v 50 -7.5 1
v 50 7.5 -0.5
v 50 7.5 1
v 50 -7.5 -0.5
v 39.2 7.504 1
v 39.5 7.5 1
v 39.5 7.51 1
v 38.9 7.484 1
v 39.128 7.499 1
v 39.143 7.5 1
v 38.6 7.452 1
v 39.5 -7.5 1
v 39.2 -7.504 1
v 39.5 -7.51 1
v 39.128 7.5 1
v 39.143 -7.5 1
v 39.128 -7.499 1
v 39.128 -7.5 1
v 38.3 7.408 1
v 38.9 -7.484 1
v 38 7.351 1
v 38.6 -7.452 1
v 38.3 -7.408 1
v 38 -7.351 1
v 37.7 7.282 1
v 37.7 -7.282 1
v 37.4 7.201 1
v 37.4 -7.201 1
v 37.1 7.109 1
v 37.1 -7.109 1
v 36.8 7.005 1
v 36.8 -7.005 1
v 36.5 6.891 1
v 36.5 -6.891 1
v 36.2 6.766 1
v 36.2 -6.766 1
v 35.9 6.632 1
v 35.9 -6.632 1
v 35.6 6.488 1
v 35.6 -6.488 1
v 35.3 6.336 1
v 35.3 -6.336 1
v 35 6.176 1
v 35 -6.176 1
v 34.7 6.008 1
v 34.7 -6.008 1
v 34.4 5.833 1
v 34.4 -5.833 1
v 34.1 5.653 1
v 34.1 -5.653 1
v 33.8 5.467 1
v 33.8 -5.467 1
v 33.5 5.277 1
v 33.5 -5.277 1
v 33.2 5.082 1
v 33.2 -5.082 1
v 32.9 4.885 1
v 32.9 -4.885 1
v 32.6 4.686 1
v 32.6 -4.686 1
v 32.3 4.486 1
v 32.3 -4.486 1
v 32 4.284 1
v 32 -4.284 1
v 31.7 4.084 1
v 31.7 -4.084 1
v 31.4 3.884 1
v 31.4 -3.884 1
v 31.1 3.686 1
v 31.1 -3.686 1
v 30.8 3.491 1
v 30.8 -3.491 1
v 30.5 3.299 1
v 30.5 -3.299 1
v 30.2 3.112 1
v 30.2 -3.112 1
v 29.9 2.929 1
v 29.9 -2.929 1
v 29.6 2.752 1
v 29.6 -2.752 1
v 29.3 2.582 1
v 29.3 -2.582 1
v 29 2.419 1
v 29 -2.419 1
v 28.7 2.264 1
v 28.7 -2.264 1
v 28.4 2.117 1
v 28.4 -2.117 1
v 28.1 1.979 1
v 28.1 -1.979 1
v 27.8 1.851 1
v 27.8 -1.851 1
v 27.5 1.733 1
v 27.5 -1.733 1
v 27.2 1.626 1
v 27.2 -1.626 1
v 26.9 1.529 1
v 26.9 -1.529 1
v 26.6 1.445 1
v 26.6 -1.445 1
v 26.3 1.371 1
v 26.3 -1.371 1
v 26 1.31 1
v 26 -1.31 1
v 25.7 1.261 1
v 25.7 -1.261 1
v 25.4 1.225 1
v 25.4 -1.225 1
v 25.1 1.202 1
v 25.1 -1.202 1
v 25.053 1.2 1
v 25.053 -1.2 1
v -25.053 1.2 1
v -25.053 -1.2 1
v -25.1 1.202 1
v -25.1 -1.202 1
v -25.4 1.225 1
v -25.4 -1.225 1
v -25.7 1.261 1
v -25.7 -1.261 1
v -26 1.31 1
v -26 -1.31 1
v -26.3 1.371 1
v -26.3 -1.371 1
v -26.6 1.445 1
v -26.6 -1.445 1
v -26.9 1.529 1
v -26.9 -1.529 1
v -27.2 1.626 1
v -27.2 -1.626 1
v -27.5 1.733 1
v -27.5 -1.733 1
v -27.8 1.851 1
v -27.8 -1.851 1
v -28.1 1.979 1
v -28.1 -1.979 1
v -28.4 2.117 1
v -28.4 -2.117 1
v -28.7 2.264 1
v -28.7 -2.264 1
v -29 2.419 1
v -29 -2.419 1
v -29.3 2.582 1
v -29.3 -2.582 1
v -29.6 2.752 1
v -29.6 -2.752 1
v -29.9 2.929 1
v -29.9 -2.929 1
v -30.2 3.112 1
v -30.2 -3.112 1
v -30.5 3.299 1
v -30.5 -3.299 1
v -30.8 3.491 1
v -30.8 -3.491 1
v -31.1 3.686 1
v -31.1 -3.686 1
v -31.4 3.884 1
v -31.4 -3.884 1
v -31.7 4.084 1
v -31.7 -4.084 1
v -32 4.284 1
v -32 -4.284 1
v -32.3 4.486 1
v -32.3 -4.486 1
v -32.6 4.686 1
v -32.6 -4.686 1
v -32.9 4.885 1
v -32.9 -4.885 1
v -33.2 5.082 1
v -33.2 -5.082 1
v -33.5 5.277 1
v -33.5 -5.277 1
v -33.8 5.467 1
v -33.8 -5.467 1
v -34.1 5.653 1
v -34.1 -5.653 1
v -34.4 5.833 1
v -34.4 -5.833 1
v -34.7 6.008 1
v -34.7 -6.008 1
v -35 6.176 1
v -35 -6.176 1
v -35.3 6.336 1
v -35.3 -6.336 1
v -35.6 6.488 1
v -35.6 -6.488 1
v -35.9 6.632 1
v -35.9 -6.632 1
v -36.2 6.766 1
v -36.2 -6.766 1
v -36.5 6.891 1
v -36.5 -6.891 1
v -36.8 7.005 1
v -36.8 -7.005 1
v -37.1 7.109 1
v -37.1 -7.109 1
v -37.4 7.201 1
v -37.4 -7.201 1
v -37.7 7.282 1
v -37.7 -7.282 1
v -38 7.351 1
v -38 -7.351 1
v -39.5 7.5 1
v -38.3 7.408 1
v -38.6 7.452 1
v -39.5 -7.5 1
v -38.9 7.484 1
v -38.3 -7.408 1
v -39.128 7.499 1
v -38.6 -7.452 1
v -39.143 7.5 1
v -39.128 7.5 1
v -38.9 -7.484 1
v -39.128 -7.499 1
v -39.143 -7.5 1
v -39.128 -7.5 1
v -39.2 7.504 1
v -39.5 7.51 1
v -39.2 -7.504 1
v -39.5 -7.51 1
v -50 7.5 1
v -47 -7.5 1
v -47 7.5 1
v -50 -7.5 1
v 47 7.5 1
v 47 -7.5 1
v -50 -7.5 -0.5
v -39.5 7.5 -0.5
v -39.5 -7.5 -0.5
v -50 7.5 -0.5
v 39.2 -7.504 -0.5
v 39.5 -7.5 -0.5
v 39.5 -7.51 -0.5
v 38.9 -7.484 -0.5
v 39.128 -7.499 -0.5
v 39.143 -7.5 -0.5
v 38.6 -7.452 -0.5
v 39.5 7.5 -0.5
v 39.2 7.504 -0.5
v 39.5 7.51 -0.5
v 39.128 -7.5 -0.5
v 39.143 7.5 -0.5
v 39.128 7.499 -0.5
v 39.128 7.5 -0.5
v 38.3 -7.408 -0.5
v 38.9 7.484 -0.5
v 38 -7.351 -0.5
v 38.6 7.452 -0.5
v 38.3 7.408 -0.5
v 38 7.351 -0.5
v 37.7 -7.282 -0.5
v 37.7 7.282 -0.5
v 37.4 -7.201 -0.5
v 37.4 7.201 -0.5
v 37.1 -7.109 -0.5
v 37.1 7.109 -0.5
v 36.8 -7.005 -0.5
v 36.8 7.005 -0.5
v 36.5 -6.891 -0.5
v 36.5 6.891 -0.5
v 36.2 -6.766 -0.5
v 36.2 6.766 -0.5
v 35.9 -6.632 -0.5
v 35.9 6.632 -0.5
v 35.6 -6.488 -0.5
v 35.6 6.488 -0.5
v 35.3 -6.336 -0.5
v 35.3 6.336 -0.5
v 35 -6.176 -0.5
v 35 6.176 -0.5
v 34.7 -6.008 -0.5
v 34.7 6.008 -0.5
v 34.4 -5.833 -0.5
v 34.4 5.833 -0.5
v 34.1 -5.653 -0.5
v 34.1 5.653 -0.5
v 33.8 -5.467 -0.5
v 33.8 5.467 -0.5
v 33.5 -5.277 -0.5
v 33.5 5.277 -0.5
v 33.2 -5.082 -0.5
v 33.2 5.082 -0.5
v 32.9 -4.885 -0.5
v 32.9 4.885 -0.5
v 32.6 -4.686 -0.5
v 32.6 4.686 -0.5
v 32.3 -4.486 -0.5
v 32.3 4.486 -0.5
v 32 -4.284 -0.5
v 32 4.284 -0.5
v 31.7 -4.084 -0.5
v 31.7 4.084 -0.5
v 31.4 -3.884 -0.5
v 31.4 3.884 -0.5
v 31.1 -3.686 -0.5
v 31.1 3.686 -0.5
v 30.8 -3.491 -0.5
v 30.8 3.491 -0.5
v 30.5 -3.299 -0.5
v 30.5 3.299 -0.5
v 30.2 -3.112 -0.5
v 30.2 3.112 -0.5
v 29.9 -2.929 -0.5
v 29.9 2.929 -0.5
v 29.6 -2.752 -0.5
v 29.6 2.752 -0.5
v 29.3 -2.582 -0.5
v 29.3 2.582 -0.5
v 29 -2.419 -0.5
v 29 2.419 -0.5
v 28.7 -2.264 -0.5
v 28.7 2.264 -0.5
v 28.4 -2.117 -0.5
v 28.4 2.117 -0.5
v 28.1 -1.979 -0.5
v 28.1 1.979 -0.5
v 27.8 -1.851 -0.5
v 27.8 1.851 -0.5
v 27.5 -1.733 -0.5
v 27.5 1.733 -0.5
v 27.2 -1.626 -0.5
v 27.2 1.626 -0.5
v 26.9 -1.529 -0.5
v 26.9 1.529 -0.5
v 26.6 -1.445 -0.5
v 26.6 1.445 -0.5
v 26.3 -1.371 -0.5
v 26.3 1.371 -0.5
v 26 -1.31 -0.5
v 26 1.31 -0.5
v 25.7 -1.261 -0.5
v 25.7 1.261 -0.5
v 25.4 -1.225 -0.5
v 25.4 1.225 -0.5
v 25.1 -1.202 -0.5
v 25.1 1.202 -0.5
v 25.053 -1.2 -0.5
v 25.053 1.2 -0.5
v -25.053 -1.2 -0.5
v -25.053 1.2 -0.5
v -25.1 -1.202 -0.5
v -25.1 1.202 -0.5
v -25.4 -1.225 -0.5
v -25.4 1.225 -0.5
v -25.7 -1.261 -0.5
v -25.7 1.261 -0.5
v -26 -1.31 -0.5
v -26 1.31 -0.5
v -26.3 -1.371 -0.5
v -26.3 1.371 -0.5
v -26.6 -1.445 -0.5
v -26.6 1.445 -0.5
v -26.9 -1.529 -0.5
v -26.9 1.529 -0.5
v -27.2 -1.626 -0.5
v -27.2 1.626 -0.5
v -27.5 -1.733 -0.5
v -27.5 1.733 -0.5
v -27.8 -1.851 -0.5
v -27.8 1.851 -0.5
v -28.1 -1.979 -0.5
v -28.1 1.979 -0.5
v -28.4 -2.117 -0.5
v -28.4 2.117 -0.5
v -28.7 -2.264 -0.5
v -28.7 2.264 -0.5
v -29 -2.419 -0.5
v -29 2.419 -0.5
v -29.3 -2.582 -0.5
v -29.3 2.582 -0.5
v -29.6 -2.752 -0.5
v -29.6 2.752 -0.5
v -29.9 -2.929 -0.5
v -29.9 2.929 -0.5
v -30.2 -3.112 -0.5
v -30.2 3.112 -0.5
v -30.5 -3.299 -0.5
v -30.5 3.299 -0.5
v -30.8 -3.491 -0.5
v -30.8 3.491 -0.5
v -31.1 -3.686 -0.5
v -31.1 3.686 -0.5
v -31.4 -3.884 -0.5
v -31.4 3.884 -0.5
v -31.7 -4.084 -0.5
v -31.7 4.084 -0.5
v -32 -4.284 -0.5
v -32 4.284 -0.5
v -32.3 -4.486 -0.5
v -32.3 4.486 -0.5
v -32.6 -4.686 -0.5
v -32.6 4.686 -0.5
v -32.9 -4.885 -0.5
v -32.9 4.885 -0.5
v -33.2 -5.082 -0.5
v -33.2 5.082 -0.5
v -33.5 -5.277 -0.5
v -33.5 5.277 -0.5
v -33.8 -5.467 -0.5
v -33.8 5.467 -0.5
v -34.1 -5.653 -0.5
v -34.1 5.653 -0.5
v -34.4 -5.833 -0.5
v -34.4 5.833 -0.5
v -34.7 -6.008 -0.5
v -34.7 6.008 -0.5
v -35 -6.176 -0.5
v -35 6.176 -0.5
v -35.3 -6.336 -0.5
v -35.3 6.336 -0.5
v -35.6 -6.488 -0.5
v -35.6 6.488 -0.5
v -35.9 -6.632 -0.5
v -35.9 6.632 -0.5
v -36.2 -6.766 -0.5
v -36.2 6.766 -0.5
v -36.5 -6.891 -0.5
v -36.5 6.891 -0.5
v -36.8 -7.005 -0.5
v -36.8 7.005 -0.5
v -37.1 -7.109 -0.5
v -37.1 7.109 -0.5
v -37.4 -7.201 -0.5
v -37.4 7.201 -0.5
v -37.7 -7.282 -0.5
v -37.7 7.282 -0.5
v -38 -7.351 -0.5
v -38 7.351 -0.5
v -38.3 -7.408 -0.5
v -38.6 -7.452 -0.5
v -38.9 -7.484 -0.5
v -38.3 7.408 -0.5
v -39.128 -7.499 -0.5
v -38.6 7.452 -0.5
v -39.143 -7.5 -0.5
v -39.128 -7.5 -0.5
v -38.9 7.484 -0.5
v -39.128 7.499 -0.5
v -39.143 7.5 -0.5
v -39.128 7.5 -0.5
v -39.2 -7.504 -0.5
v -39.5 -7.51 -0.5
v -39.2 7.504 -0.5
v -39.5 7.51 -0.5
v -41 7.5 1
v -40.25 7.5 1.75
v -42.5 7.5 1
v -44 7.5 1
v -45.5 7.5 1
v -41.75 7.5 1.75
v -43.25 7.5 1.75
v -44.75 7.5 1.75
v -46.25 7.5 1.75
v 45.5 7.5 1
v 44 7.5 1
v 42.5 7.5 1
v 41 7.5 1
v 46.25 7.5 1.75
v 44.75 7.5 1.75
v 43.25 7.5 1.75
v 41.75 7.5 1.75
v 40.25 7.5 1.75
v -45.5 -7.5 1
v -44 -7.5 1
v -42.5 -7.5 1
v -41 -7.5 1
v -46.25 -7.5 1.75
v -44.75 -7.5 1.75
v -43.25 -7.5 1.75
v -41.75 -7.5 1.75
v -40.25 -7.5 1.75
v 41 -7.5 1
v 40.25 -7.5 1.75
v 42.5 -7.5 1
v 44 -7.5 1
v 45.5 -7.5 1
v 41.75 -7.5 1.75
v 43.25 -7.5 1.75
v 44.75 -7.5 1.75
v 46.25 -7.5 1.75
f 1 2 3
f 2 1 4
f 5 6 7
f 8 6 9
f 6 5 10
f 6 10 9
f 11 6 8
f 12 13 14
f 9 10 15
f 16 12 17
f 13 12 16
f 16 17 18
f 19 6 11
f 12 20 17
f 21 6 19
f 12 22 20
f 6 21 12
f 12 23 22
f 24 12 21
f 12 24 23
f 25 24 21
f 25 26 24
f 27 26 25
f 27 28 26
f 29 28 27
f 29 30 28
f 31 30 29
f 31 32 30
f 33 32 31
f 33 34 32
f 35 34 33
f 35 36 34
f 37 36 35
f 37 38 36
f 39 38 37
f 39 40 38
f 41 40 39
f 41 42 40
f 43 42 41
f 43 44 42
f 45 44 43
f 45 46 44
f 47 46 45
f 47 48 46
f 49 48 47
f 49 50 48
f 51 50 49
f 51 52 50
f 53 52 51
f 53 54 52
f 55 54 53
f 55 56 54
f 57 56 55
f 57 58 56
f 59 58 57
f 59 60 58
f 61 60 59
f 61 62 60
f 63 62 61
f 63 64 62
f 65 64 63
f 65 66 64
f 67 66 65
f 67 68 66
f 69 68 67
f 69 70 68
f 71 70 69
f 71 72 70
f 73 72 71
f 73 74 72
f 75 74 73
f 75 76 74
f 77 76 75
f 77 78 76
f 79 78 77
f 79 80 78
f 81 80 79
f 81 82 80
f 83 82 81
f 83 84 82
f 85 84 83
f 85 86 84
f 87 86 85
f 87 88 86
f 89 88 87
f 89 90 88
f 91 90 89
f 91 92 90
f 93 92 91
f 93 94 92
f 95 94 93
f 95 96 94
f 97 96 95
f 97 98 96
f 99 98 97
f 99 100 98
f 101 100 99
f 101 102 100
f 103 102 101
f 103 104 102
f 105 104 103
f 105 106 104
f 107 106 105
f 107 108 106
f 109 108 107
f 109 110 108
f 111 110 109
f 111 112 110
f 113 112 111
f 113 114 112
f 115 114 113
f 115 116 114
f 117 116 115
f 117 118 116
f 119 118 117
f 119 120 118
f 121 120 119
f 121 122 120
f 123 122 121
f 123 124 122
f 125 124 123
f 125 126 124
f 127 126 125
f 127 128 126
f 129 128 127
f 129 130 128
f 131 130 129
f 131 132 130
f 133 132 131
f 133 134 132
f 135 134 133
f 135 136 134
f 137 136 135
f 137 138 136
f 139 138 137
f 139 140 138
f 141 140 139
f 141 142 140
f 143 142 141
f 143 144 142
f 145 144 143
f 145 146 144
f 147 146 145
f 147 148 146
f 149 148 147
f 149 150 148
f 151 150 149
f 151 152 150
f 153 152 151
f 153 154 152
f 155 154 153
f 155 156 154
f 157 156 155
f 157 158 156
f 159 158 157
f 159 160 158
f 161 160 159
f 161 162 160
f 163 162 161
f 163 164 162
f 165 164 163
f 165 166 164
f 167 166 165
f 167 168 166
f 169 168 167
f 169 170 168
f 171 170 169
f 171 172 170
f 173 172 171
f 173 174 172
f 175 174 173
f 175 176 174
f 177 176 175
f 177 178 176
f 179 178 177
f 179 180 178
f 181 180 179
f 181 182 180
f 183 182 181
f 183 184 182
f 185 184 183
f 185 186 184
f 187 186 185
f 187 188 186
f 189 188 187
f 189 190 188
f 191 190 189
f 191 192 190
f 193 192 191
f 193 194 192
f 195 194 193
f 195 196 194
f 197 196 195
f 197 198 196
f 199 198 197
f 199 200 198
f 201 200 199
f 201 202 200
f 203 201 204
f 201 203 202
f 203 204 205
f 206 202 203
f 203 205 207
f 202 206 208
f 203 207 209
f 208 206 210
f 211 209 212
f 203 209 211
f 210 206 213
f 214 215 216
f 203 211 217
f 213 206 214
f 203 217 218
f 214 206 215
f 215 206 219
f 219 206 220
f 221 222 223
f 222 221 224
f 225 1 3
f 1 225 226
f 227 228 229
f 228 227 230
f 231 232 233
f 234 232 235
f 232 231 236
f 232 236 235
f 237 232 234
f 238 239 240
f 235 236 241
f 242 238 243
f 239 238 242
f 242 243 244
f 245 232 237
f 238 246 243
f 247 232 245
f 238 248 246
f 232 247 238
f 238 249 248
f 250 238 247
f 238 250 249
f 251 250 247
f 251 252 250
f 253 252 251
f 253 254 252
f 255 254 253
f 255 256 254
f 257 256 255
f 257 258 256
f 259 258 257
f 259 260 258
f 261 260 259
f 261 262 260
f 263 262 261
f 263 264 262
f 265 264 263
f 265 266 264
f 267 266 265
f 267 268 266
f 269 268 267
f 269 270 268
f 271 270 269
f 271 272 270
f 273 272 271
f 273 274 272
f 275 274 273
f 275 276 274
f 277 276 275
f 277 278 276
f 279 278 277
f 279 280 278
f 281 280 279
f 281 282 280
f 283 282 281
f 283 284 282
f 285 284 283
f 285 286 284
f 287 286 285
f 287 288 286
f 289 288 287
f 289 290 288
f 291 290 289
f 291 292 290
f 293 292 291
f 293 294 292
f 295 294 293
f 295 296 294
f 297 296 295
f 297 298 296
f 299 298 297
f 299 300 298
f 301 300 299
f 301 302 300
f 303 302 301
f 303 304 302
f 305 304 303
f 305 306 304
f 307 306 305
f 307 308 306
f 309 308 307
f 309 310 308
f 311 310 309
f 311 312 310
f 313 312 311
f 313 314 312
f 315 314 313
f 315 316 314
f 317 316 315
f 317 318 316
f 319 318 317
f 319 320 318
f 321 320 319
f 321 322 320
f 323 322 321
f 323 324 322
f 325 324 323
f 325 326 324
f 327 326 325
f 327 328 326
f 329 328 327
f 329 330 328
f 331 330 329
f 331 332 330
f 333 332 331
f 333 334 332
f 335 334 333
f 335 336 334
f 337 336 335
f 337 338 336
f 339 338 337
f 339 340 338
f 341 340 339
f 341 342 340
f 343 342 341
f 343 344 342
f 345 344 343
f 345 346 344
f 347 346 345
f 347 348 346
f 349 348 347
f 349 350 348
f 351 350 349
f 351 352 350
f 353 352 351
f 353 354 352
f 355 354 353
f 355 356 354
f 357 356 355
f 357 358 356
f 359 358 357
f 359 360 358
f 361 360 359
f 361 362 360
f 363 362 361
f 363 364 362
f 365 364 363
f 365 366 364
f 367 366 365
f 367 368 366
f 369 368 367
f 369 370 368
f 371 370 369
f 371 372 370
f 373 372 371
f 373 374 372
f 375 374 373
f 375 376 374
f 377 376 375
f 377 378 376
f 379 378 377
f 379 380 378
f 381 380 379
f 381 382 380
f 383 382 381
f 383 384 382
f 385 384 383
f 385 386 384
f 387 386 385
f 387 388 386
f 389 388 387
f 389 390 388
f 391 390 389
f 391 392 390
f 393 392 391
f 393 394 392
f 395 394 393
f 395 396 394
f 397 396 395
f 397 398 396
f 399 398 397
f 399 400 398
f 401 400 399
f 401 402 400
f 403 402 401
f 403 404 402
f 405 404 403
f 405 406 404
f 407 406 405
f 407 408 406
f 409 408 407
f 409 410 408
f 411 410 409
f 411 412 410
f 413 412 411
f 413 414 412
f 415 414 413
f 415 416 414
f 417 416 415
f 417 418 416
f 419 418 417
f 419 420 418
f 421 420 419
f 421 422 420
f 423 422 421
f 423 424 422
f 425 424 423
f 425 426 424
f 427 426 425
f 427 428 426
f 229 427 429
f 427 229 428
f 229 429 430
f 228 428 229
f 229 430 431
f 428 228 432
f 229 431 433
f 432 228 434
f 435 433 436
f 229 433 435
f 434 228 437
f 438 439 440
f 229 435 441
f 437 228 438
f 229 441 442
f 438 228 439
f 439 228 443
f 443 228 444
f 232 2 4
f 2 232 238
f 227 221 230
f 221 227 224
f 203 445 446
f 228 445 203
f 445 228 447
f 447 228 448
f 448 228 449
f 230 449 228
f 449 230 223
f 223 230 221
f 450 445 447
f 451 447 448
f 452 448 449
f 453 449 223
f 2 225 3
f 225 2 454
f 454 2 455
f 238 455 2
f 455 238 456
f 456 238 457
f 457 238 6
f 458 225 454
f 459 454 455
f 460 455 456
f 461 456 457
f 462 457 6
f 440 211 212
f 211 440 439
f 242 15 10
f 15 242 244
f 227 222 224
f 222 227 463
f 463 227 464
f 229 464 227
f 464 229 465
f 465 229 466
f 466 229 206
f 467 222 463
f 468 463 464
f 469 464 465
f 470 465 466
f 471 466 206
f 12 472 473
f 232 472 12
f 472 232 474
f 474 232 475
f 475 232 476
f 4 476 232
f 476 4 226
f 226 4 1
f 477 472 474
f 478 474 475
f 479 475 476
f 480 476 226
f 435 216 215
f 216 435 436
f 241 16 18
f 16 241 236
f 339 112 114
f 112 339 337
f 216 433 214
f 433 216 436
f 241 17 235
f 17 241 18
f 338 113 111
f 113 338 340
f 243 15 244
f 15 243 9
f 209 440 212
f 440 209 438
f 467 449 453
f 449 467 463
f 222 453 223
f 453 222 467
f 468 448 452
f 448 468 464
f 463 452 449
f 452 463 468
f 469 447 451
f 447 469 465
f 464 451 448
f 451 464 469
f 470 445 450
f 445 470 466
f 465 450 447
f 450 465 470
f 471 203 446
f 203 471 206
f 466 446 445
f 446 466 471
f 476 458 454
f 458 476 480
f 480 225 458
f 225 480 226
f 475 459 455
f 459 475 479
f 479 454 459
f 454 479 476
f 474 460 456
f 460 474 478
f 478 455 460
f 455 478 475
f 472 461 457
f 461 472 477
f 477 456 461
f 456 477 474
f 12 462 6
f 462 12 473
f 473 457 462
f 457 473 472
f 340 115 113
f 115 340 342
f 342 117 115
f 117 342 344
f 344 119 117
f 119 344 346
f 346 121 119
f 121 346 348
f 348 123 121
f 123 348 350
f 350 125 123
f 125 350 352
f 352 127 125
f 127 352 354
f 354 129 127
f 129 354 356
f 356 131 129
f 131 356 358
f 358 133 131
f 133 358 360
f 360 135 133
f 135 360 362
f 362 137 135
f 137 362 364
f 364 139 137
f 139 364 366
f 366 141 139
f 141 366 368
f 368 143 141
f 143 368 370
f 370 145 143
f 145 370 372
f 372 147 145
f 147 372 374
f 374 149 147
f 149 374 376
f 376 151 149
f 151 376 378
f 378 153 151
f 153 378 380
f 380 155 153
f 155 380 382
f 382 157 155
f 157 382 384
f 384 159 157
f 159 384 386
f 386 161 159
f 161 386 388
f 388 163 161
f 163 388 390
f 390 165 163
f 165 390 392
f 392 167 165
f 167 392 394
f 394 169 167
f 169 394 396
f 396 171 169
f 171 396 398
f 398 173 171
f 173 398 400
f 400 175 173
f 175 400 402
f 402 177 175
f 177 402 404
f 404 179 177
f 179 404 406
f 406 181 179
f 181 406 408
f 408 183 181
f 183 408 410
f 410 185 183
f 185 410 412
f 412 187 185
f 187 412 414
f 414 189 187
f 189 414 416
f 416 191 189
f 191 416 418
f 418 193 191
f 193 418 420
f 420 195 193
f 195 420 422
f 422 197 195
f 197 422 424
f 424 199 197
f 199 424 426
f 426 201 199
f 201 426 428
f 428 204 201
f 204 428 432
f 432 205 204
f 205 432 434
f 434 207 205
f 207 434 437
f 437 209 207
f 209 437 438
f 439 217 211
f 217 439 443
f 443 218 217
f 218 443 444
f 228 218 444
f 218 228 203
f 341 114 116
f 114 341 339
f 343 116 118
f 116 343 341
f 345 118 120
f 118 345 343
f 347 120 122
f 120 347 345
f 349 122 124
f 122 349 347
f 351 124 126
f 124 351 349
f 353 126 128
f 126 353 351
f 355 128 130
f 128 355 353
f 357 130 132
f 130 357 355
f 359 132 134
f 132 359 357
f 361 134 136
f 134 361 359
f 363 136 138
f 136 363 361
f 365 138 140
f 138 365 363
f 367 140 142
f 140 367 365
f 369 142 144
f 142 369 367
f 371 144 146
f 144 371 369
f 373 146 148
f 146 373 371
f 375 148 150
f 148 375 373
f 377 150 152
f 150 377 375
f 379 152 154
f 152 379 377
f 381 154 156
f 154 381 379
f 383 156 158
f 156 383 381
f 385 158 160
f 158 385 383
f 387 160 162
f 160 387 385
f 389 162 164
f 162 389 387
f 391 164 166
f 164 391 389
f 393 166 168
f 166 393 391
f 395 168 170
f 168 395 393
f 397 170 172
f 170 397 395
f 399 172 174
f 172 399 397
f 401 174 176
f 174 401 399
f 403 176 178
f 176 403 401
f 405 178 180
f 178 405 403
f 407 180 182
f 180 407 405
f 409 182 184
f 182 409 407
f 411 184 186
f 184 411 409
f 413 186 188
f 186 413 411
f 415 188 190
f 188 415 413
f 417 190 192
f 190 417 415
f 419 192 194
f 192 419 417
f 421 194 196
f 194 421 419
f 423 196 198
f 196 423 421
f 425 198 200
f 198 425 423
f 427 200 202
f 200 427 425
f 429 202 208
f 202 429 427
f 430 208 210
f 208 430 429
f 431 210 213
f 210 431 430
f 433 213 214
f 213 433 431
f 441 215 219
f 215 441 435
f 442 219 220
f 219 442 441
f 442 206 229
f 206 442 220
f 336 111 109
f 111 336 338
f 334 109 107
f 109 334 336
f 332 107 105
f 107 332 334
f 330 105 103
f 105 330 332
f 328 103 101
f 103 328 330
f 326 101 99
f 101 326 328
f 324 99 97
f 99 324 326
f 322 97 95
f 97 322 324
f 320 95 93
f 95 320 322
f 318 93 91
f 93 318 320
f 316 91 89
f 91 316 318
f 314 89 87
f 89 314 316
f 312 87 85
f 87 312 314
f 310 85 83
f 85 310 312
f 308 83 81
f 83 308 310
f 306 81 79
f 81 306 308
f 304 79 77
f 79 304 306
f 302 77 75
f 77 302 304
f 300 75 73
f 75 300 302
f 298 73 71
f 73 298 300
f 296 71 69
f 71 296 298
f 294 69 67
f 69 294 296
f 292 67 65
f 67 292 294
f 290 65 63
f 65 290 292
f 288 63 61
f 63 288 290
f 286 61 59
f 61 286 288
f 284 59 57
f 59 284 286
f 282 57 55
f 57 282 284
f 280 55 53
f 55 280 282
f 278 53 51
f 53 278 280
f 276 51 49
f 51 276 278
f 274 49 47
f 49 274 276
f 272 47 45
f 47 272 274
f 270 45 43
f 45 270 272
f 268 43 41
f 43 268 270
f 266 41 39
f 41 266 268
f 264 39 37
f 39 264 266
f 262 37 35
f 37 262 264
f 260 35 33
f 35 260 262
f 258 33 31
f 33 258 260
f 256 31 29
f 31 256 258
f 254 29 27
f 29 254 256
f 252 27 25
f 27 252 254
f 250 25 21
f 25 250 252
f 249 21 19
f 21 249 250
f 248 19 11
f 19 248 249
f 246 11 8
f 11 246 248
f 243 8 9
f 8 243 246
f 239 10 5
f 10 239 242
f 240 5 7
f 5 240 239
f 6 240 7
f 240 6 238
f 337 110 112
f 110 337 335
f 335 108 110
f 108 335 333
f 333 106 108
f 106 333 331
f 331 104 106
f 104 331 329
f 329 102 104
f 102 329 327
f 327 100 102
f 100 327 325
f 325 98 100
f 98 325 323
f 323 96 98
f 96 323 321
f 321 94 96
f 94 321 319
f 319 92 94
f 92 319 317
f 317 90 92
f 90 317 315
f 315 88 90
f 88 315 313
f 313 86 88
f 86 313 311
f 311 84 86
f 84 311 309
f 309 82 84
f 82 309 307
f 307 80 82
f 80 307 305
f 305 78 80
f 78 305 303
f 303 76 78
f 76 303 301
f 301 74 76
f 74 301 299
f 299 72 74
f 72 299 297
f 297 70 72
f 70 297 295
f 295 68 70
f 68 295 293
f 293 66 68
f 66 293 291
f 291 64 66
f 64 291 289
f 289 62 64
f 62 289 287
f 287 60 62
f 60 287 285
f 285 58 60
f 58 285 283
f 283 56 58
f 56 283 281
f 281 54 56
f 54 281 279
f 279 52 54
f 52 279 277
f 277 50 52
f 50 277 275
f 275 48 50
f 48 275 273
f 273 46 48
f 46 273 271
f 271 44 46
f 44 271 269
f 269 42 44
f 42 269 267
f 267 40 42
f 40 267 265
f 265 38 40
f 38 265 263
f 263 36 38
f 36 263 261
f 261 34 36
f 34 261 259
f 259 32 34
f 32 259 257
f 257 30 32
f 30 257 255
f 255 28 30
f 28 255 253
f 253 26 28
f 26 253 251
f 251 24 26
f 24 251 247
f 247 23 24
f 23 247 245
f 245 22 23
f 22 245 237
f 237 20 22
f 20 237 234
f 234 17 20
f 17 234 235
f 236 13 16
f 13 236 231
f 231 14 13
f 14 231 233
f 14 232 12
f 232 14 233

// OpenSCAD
$fn=60;
difference(){
translate([0,0,0.25])cube([100,15,1.5],center=true);
hull(){
translate([-28,-14.20,-2])cylinder(d=26,h=4);
translate([28,-14.2,-2])cylinder(d=26,h=4);
}
hull(){
translate([-28,14.20,-2])cylinder(d=26,h=4);
translate([28,14.20,-2])cylinder(d=26,h=4);
}
}
translate([-47,-7.5,0.25])teeth();
mirror([1,0,0])translate([-47,-7.5,0.25])teeth();

module teeth(){
intersection(){
rotate([-90,0,0])translate([0.75,0,0])
union(){
translate([0,0,0])cylinder(d=3,h=15,$fn=4);
translate([1.5,0,0])cylinder(d=3,h=15,$fn=4);
translate([3,0,0])cylinder(d=3,h=15,$fn=4);
translate([4.5,0,0])cylinder(d=3,h=15,$fn=4);
translate([6,0,0])cylinder(d=3,h=15,$fn=4);
}
translate([0,0,0])cube([7.5,15,10]);
}
}

//cube(2.4,center=true);

difference(){
translate([-39.5,4.35,-0.5])
scale([1.5,3.16,1])curva(1.5);
translate([0,-5,0])cube([100,10,4],center=true);
}
mirror([0,1,0])
difference(){
translate([-39.5,4.35,-0.5])
scale([1.5,3.16,1])curva(1.5);
translate([0,-5,0])cube([100,10,4],center=true);
}
mirror([1,0,0])
difference(){
translate([-39.5,4.35,-0.5])
scale([1.5,3.16,1])curva(1.5);
translate([0,-5,0])cube([100,10,4],center=true);
}
mirror([0,1,0])mirror([1,0,0])
difference(){
translate([-39.5,4.35,-0.5])
scale([1.5,3.16,1])curva(1.5);
translate([0,-5,0])cube([100,10,4],center=true);
}



module curva(e){
linear_extrude(e)
polygon([[0,1.0000],[0.2000,0.9980],[0.4000,0.9919],
[0.6000,0.9818],[0.8000,0.9678],[1.0000,0.9498],
[1.2000,0.9279],[1.4000,0.9023],[1.6000,0.8731],
[1.8000,0.8403],[2.0000,0.8041],[2.2000,0.7647],
[2.4000,0.7221],[2.6000,0.6766],[2.8000,0.6284],
[3.0000,0.5777],[3.2000,0.5246],[3.4000,0.4693],
[3.6000,0.4122],[3.8000,0.3534],[4.0000,0.2932],
[4.2000,0.2318],[4.4000,0.1694],[4.6000,0.1064],
[4.8000,0.0429],[5.0000,-0.0208],[5.2000,-0.0843],
[5.4000,-0.1475],[5.6000,-0.2102],[5.8000,-0.2719],
[6.0000,-0.3326],[6.2000,-0.3919],[6.4000,-0.4497],
[6.6000,-0.5056],[6.8000,-0.5594],[7.0000,-0.6110],
[7.2000,-0.6602],[7.4000,-0.7066],[7.6000,-0.7502],
[7.8000,-0.7907],[8.0000,-0.8281],[8.2000,-0.8621],
[8.4000,-0.8926],[8.6000,-0.9194],[8.8000,-0.9426],
[9.0000,-0.9619],[9.2000,-0.9774],[9.4000,-0.9888],
[9.6000,-0.9963],[9.8000,-0.9998],[10.0000,-0.9991],
[10.0000,-1.9991],[9.8000,-1.9998],[9.6000,-1.9963],
[9.4000,-1.9888],[9.2000,-1.9774],[9.0000,-1.9619],
[8.8000,-1.9426],[8.6000,-1.9194],[8.4000,-1.8926],
[8.2000,-1.8621],[8.0000,-1.8281],[7.8000,-1.7907],
[7.6000,-1.7502],[7.4000,-1.7066],[7.2000,-1.6602],
[7.0000,-1.6110],[6.8000,-1.5594],[6.6000,-1.5056],
[6.4000,-1.4497],[6.2000,-1.3919],[6.0000,-1.3326],
[5.8000,-1.2719],[5.6000,-1.2102],[5.4000,-1.1475],
[5.2000,-1.0843],[5.0000,-1.0208],[4.8000,.0429-1],
[4.6000,.1064-1],[4.4000,.1694-1],[4.2000,.2318-1],
[4.0000,.2932-1],[3.8000,.3534-1],[3.6000,.4122-1],
[3.4000,.4693-1],[3.2000,.5246-1],[3.0000,.5777-1],
[2.8000,.6284-1],[2.6000,.6766-1],[2.4000,.7221-1],
[2.2000,.7647-1],[2.0000,.8041-1],[1.8000,.8403-1],
[1.6000,.8731-1],[1.4000,.9023-1],[1.2000,.9279-1],
[1.0000,.9498-1],[0.8000,.9678-1],[0.6000,.9818-1],
[0.4000,.9919-1],[0.2000,.9980-1],[0,.0000]
]);
}
